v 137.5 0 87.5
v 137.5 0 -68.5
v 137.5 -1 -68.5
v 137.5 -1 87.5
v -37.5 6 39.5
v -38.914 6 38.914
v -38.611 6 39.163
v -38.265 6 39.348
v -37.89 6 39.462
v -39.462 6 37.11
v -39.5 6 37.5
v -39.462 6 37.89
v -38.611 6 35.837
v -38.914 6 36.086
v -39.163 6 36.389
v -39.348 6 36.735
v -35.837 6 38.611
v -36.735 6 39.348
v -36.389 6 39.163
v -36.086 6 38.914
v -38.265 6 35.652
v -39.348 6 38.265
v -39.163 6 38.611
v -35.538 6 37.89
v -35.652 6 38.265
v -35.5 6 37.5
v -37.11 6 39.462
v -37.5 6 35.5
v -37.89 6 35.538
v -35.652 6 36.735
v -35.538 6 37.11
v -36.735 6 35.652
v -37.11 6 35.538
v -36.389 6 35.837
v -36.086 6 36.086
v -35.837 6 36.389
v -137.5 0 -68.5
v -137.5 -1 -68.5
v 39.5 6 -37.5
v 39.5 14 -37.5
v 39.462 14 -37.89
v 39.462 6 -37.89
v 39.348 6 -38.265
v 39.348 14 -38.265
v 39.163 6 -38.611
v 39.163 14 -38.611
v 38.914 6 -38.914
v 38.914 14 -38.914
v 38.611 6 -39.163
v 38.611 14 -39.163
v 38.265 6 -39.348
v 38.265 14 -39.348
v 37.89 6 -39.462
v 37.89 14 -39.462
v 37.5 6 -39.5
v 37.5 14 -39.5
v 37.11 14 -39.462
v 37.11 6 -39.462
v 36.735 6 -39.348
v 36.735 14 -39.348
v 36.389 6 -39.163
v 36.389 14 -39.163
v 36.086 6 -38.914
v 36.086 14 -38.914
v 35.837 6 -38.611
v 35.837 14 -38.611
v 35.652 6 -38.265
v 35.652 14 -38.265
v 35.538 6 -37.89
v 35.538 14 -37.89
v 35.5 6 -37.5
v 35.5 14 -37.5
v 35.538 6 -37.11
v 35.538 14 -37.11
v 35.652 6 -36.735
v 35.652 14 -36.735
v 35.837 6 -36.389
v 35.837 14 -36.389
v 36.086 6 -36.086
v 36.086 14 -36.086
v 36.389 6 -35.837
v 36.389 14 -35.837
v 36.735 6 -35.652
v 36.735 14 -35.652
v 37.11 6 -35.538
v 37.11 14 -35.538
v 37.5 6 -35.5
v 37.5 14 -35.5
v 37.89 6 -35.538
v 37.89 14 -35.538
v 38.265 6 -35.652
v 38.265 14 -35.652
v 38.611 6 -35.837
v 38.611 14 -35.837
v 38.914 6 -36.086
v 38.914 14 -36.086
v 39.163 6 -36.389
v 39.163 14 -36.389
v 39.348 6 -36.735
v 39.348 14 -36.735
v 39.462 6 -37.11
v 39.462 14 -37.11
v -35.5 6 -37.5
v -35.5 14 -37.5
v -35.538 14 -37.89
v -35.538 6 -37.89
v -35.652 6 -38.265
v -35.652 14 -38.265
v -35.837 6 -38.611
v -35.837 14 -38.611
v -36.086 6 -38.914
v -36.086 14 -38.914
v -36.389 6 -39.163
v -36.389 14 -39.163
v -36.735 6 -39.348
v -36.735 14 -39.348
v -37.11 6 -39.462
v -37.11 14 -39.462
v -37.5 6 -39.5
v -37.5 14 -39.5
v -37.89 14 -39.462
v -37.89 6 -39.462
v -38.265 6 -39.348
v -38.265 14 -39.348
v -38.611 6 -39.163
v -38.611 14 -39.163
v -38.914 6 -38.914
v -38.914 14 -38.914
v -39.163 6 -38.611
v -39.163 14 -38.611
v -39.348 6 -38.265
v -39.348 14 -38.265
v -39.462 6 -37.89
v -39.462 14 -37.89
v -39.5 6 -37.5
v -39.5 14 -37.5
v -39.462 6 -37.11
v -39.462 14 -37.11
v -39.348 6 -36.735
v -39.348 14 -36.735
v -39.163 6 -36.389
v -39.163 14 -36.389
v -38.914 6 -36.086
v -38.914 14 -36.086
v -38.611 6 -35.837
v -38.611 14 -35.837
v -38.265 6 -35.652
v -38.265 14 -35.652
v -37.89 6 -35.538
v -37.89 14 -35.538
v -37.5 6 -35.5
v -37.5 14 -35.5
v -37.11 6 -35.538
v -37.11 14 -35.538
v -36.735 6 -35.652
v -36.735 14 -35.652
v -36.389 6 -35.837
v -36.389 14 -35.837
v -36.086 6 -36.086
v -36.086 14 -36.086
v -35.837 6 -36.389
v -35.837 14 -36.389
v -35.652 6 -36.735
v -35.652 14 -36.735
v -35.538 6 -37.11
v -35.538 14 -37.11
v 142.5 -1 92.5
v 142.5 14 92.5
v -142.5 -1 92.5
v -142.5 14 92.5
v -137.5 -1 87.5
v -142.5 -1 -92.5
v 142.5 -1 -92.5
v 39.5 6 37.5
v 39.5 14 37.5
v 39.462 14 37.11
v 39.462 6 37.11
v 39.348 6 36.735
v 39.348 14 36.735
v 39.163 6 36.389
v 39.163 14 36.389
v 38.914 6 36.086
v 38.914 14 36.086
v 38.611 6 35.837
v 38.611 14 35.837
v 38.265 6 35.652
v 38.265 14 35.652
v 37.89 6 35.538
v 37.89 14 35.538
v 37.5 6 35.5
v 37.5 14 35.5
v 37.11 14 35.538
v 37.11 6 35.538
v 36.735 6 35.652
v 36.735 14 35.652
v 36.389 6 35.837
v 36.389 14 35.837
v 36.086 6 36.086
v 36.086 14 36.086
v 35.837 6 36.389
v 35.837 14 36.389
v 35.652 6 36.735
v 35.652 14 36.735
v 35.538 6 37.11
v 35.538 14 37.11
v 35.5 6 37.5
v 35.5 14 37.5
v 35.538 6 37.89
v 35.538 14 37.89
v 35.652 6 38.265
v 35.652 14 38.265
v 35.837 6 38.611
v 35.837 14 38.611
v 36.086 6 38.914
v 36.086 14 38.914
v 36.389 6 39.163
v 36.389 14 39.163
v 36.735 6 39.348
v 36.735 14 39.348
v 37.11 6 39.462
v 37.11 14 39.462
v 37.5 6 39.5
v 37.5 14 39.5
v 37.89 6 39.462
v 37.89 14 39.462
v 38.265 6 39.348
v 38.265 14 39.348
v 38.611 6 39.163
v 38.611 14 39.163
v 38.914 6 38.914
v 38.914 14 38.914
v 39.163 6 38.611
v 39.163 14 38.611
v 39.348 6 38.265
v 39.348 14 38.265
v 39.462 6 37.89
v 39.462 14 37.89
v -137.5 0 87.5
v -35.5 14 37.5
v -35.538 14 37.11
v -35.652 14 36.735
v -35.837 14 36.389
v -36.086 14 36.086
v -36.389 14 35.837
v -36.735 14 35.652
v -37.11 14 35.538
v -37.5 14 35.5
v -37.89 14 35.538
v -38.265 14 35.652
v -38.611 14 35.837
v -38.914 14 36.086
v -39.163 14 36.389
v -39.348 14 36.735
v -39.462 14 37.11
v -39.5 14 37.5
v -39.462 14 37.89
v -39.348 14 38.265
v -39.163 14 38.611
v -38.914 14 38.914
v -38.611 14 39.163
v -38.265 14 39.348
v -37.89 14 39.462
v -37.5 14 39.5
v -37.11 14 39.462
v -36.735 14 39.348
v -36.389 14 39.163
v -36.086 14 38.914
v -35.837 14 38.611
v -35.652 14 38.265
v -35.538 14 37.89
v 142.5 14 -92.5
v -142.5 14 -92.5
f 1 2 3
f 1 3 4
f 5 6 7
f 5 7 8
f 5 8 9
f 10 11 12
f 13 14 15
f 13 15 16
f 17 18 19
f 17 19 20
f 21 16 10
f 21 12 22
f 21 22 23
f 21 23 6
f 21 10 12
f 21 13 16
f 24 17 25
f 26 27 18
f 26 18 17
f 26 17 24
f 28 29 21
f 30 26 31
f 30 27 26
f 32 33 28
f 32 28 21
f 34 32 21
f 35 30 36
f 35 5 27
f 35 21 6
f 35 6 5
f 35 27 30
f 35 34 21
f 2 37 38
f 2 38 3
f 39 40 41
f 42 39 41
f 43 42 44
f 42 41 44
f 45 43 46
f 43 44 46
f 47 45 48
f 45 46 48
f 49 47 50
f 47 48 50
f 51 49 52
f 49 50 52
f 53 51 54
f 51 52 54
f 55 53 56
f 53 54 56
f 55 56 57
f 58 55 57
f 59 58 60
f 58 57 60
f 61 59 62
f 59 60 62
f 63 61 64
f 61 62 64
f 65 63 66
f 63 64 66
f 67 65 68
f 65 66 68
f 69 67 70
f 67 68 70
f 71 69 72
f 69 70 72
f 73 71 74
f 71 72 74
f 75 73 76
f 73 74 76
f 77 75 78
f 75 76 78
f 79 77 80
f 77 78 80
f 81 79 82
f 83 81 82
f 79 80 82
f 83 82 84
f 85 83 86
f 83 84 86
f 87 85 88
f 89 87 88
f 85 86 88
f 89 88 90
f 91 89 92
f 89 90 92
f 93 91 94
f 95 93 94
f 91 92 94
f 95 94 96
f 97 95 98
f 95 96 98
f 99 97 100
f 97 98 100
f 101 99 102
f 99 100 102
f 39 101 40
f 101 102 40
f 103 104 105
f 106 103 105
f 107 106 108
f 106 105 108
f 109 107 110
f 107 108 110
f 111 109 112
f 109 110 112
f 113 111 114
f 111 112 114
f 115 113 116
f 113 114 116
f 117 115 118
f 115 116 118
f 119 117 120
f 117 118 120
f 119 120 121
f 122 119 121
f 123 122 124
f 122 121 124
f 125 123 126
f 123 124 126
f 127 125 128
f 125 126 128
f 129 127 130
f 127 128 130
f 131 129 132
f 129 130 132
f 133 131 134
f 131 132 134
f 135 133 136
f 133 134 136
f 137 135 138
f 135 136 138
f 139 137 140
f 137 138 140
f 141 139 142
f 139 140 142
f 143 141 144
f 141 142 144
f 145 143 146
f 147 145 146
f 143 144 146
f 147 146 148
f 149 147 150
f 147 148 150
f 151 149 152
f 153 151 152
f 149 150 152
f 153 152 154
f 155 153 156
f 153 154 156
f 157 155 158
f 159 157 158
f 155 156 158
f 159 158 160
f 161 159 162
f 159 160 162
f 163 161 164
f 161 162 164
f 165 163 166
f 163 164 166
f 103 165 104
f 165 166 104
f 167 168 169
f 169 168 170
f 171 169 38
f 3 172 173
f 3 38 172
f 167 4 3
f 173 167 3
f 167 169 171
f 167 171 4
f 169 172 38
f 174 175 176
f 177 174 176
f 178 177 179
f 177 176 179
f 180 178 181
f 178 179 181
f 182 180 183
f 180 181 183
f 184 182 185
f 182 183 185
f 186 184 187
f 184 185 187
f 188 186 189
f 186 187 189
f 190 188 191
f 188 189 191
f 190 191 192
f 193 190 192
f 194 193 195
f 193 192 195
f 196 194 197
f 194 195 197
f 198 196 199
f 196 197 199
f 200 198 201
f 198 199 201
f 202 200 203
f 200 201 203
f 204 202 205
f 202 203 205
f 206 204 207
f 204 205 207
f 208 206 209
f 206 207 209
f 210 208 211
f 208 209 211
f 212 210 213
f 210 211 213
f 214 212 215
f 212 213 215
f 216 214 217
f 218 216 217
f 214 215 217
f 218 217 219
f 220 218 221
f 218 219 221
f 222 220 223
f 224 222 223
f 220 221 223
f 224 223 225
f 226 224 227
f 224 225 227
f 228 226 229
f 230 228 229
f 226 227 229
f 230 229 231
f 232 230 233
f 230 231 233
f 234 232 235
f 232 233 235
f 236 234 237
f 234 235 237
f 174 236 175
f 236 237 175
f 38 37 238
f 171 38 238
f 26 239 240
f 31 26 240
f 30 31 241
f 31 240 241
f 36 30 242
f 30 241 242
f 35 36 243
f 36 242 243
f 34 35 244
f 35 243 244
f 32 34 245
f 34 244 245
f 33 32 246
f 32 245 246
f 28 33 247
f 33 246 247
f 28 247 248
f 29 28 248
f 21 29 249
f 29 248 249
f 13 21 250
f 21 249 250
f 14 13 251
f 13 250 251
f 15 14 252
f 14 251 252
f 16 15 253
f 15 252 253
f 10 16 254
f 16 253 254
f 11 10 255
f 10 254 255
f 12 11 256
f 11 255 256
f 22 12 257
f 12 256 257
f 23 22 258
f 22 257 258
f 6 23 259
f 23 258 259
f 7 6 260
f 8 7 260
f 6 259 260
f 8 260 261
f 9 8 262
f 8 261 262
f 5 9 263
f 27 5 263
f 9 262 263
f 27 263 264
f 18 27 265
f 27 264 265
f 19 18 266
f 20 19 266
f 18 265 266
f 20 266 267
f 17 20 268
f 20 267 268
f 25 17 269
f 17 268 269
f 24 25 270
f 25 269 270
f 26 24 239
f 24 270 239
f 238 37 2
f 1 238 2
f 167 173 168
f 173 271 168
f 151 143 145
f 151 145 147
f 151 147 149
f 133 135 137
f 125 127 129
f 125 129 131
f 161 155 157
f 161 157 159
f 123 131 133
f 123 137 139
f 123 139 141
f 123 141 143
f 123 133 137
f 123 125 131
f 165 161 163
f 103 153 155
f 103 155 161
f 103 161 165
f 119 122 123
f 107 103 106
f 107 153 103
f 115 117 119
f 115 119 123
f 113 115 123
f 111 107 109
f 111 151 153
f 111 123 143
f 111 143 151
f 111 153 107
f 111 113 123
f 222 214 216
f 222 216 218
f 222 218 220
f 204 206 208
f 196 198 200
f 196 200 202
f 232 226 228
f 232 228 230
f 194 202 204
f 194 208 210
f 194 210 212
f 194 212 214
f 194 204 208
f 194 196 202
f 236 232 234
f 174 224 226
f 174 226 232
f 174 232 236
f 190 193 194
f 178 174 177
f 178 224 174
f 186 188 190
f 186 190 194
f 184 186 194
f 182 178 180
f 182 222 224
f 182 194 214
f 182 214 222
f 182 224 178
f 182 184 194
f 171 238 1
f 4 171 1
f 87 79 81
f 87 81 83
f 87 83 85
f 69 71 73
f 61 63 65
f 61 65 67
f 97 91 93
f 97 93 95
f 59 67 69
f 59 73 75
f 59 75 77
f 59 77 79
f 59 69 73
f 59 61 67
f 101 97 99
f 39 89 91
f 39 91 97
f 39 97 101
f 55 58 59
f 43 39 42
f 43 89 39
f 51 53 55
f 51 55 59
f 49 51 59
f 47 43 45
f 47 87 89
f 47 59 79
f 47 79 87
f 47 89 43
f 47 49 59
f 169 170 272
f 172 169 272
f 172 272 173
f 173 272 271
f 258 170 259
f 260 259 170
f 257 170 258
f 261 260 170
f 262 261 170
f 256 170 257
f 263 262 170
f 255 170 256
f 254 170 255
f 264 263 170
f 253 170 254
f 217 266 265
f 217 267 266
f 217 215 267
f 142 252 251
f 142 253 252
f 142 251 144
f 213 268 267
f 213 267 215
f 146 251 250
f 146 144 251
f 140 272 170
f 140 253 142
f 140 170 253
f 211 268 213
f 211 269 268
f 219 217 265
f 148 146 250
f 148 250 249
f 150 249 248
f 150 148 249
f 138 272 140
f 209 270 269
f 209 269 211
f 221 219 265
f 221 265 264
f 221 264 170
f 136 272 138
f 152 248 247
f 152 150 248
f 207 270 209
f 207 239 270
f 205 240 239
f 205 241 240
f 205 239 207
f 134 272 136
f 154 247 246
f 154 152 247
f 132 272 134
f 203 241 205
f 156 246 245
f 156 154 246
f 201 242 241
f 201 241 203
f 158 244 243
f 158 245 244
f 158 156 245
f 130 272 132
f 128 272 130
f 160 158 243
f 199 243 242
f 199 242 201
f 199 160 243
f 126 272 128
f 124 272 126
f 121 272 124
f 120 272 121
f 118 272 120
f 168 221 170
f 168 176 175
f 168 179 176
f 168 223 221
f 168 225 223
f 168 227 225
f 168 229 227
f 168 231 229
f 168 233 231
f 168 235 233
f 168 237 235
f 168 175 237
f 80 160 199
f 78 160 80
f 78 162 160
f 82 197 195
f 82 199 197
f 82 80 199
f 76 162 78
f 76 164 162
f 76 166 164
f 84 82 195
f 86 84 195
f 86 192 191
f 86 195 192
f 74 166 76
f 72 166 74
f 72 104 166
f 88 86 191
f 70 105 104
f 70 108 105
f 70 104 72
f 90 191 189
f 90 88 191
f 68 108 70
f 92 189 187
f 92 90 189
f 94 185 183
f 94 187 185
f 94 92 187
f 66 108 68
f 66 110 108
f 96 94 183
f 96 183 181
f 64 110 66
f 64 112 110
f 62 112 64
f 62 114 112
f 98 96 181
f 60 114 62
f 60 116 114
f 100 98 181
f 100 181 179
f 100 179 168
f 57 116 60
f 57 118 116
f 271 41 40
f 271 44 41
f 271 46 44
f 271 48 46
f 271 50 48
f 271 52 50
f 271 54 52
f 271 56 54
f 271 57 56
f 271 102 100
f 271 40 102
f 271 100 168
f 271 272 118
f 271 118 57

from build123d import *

# Parameters (mm, degrees)
SKETCH_1_W          = 285
SKETCH_1_H          = 185
EXTRUDE_1_DEPTH     = 14
SKETCH_2_R          = 2
CUT_EXTRUDE_1_DEPTH = 8
SKETCH_3_W          = 275
SKETCH_3_H          = 156
EXTRUDE_2_DEPTH     = 1


with BuildPart() as part:
    # 草图1 → 凸台-拉伸1 (new body)
    with BuildSketch(Plane(origin=(0, 0, 0), x_dir=(1, 0, 0), z_dir=(0, 1, 0))):
        Rectangle(SKETCH_1_W, SKETCH_1_H)
    extrude(amount=EXTRUDE_1_DEPTH)

    # 草图2 → 切除-拉伸1 (cut)
    with BuildSketch(Plane(origin=(0, 14, 0), x_dir=(1, 0, 0), z_dir=(0, 1, 0))):
        with Locations((-37.5, 37.5)):
            Circle(SKETCH_2_R)
        with Locations((37.5, 37.5)):
            Circle(SKETCH_2_R)
        with Locations((37.5, -37.5)):
            Circle(SKETCH_2_R)
        with Locations((-37.5, -37.5)):
            Circle(SKETCH_2_R)
    extrude(amount=-CUT_EXTRUDE_1_DEPTH, mode=Mode.SUBTRACT)

    # 草图3 → 凸台-拉伸2 (add)
    with BuildSketch(Plane.XZ):
        Polygon((-142.5, -92.5), (142.5, -92.5), (142.5, -68.5), (142.5, 92.5), (137.5, 92.5), (-137.5, 92.5), (-142.5, 92.5), (-142.5, -68.5), align=None)
        with Locations((0, 9.5)):
            Rectangle(SKETCH_3_W, SKETCH_3_H, mode=Mode.SUBTRACT)
    extrude(amount=EXTRUDE_2_DEPTH)


solid = part.part
